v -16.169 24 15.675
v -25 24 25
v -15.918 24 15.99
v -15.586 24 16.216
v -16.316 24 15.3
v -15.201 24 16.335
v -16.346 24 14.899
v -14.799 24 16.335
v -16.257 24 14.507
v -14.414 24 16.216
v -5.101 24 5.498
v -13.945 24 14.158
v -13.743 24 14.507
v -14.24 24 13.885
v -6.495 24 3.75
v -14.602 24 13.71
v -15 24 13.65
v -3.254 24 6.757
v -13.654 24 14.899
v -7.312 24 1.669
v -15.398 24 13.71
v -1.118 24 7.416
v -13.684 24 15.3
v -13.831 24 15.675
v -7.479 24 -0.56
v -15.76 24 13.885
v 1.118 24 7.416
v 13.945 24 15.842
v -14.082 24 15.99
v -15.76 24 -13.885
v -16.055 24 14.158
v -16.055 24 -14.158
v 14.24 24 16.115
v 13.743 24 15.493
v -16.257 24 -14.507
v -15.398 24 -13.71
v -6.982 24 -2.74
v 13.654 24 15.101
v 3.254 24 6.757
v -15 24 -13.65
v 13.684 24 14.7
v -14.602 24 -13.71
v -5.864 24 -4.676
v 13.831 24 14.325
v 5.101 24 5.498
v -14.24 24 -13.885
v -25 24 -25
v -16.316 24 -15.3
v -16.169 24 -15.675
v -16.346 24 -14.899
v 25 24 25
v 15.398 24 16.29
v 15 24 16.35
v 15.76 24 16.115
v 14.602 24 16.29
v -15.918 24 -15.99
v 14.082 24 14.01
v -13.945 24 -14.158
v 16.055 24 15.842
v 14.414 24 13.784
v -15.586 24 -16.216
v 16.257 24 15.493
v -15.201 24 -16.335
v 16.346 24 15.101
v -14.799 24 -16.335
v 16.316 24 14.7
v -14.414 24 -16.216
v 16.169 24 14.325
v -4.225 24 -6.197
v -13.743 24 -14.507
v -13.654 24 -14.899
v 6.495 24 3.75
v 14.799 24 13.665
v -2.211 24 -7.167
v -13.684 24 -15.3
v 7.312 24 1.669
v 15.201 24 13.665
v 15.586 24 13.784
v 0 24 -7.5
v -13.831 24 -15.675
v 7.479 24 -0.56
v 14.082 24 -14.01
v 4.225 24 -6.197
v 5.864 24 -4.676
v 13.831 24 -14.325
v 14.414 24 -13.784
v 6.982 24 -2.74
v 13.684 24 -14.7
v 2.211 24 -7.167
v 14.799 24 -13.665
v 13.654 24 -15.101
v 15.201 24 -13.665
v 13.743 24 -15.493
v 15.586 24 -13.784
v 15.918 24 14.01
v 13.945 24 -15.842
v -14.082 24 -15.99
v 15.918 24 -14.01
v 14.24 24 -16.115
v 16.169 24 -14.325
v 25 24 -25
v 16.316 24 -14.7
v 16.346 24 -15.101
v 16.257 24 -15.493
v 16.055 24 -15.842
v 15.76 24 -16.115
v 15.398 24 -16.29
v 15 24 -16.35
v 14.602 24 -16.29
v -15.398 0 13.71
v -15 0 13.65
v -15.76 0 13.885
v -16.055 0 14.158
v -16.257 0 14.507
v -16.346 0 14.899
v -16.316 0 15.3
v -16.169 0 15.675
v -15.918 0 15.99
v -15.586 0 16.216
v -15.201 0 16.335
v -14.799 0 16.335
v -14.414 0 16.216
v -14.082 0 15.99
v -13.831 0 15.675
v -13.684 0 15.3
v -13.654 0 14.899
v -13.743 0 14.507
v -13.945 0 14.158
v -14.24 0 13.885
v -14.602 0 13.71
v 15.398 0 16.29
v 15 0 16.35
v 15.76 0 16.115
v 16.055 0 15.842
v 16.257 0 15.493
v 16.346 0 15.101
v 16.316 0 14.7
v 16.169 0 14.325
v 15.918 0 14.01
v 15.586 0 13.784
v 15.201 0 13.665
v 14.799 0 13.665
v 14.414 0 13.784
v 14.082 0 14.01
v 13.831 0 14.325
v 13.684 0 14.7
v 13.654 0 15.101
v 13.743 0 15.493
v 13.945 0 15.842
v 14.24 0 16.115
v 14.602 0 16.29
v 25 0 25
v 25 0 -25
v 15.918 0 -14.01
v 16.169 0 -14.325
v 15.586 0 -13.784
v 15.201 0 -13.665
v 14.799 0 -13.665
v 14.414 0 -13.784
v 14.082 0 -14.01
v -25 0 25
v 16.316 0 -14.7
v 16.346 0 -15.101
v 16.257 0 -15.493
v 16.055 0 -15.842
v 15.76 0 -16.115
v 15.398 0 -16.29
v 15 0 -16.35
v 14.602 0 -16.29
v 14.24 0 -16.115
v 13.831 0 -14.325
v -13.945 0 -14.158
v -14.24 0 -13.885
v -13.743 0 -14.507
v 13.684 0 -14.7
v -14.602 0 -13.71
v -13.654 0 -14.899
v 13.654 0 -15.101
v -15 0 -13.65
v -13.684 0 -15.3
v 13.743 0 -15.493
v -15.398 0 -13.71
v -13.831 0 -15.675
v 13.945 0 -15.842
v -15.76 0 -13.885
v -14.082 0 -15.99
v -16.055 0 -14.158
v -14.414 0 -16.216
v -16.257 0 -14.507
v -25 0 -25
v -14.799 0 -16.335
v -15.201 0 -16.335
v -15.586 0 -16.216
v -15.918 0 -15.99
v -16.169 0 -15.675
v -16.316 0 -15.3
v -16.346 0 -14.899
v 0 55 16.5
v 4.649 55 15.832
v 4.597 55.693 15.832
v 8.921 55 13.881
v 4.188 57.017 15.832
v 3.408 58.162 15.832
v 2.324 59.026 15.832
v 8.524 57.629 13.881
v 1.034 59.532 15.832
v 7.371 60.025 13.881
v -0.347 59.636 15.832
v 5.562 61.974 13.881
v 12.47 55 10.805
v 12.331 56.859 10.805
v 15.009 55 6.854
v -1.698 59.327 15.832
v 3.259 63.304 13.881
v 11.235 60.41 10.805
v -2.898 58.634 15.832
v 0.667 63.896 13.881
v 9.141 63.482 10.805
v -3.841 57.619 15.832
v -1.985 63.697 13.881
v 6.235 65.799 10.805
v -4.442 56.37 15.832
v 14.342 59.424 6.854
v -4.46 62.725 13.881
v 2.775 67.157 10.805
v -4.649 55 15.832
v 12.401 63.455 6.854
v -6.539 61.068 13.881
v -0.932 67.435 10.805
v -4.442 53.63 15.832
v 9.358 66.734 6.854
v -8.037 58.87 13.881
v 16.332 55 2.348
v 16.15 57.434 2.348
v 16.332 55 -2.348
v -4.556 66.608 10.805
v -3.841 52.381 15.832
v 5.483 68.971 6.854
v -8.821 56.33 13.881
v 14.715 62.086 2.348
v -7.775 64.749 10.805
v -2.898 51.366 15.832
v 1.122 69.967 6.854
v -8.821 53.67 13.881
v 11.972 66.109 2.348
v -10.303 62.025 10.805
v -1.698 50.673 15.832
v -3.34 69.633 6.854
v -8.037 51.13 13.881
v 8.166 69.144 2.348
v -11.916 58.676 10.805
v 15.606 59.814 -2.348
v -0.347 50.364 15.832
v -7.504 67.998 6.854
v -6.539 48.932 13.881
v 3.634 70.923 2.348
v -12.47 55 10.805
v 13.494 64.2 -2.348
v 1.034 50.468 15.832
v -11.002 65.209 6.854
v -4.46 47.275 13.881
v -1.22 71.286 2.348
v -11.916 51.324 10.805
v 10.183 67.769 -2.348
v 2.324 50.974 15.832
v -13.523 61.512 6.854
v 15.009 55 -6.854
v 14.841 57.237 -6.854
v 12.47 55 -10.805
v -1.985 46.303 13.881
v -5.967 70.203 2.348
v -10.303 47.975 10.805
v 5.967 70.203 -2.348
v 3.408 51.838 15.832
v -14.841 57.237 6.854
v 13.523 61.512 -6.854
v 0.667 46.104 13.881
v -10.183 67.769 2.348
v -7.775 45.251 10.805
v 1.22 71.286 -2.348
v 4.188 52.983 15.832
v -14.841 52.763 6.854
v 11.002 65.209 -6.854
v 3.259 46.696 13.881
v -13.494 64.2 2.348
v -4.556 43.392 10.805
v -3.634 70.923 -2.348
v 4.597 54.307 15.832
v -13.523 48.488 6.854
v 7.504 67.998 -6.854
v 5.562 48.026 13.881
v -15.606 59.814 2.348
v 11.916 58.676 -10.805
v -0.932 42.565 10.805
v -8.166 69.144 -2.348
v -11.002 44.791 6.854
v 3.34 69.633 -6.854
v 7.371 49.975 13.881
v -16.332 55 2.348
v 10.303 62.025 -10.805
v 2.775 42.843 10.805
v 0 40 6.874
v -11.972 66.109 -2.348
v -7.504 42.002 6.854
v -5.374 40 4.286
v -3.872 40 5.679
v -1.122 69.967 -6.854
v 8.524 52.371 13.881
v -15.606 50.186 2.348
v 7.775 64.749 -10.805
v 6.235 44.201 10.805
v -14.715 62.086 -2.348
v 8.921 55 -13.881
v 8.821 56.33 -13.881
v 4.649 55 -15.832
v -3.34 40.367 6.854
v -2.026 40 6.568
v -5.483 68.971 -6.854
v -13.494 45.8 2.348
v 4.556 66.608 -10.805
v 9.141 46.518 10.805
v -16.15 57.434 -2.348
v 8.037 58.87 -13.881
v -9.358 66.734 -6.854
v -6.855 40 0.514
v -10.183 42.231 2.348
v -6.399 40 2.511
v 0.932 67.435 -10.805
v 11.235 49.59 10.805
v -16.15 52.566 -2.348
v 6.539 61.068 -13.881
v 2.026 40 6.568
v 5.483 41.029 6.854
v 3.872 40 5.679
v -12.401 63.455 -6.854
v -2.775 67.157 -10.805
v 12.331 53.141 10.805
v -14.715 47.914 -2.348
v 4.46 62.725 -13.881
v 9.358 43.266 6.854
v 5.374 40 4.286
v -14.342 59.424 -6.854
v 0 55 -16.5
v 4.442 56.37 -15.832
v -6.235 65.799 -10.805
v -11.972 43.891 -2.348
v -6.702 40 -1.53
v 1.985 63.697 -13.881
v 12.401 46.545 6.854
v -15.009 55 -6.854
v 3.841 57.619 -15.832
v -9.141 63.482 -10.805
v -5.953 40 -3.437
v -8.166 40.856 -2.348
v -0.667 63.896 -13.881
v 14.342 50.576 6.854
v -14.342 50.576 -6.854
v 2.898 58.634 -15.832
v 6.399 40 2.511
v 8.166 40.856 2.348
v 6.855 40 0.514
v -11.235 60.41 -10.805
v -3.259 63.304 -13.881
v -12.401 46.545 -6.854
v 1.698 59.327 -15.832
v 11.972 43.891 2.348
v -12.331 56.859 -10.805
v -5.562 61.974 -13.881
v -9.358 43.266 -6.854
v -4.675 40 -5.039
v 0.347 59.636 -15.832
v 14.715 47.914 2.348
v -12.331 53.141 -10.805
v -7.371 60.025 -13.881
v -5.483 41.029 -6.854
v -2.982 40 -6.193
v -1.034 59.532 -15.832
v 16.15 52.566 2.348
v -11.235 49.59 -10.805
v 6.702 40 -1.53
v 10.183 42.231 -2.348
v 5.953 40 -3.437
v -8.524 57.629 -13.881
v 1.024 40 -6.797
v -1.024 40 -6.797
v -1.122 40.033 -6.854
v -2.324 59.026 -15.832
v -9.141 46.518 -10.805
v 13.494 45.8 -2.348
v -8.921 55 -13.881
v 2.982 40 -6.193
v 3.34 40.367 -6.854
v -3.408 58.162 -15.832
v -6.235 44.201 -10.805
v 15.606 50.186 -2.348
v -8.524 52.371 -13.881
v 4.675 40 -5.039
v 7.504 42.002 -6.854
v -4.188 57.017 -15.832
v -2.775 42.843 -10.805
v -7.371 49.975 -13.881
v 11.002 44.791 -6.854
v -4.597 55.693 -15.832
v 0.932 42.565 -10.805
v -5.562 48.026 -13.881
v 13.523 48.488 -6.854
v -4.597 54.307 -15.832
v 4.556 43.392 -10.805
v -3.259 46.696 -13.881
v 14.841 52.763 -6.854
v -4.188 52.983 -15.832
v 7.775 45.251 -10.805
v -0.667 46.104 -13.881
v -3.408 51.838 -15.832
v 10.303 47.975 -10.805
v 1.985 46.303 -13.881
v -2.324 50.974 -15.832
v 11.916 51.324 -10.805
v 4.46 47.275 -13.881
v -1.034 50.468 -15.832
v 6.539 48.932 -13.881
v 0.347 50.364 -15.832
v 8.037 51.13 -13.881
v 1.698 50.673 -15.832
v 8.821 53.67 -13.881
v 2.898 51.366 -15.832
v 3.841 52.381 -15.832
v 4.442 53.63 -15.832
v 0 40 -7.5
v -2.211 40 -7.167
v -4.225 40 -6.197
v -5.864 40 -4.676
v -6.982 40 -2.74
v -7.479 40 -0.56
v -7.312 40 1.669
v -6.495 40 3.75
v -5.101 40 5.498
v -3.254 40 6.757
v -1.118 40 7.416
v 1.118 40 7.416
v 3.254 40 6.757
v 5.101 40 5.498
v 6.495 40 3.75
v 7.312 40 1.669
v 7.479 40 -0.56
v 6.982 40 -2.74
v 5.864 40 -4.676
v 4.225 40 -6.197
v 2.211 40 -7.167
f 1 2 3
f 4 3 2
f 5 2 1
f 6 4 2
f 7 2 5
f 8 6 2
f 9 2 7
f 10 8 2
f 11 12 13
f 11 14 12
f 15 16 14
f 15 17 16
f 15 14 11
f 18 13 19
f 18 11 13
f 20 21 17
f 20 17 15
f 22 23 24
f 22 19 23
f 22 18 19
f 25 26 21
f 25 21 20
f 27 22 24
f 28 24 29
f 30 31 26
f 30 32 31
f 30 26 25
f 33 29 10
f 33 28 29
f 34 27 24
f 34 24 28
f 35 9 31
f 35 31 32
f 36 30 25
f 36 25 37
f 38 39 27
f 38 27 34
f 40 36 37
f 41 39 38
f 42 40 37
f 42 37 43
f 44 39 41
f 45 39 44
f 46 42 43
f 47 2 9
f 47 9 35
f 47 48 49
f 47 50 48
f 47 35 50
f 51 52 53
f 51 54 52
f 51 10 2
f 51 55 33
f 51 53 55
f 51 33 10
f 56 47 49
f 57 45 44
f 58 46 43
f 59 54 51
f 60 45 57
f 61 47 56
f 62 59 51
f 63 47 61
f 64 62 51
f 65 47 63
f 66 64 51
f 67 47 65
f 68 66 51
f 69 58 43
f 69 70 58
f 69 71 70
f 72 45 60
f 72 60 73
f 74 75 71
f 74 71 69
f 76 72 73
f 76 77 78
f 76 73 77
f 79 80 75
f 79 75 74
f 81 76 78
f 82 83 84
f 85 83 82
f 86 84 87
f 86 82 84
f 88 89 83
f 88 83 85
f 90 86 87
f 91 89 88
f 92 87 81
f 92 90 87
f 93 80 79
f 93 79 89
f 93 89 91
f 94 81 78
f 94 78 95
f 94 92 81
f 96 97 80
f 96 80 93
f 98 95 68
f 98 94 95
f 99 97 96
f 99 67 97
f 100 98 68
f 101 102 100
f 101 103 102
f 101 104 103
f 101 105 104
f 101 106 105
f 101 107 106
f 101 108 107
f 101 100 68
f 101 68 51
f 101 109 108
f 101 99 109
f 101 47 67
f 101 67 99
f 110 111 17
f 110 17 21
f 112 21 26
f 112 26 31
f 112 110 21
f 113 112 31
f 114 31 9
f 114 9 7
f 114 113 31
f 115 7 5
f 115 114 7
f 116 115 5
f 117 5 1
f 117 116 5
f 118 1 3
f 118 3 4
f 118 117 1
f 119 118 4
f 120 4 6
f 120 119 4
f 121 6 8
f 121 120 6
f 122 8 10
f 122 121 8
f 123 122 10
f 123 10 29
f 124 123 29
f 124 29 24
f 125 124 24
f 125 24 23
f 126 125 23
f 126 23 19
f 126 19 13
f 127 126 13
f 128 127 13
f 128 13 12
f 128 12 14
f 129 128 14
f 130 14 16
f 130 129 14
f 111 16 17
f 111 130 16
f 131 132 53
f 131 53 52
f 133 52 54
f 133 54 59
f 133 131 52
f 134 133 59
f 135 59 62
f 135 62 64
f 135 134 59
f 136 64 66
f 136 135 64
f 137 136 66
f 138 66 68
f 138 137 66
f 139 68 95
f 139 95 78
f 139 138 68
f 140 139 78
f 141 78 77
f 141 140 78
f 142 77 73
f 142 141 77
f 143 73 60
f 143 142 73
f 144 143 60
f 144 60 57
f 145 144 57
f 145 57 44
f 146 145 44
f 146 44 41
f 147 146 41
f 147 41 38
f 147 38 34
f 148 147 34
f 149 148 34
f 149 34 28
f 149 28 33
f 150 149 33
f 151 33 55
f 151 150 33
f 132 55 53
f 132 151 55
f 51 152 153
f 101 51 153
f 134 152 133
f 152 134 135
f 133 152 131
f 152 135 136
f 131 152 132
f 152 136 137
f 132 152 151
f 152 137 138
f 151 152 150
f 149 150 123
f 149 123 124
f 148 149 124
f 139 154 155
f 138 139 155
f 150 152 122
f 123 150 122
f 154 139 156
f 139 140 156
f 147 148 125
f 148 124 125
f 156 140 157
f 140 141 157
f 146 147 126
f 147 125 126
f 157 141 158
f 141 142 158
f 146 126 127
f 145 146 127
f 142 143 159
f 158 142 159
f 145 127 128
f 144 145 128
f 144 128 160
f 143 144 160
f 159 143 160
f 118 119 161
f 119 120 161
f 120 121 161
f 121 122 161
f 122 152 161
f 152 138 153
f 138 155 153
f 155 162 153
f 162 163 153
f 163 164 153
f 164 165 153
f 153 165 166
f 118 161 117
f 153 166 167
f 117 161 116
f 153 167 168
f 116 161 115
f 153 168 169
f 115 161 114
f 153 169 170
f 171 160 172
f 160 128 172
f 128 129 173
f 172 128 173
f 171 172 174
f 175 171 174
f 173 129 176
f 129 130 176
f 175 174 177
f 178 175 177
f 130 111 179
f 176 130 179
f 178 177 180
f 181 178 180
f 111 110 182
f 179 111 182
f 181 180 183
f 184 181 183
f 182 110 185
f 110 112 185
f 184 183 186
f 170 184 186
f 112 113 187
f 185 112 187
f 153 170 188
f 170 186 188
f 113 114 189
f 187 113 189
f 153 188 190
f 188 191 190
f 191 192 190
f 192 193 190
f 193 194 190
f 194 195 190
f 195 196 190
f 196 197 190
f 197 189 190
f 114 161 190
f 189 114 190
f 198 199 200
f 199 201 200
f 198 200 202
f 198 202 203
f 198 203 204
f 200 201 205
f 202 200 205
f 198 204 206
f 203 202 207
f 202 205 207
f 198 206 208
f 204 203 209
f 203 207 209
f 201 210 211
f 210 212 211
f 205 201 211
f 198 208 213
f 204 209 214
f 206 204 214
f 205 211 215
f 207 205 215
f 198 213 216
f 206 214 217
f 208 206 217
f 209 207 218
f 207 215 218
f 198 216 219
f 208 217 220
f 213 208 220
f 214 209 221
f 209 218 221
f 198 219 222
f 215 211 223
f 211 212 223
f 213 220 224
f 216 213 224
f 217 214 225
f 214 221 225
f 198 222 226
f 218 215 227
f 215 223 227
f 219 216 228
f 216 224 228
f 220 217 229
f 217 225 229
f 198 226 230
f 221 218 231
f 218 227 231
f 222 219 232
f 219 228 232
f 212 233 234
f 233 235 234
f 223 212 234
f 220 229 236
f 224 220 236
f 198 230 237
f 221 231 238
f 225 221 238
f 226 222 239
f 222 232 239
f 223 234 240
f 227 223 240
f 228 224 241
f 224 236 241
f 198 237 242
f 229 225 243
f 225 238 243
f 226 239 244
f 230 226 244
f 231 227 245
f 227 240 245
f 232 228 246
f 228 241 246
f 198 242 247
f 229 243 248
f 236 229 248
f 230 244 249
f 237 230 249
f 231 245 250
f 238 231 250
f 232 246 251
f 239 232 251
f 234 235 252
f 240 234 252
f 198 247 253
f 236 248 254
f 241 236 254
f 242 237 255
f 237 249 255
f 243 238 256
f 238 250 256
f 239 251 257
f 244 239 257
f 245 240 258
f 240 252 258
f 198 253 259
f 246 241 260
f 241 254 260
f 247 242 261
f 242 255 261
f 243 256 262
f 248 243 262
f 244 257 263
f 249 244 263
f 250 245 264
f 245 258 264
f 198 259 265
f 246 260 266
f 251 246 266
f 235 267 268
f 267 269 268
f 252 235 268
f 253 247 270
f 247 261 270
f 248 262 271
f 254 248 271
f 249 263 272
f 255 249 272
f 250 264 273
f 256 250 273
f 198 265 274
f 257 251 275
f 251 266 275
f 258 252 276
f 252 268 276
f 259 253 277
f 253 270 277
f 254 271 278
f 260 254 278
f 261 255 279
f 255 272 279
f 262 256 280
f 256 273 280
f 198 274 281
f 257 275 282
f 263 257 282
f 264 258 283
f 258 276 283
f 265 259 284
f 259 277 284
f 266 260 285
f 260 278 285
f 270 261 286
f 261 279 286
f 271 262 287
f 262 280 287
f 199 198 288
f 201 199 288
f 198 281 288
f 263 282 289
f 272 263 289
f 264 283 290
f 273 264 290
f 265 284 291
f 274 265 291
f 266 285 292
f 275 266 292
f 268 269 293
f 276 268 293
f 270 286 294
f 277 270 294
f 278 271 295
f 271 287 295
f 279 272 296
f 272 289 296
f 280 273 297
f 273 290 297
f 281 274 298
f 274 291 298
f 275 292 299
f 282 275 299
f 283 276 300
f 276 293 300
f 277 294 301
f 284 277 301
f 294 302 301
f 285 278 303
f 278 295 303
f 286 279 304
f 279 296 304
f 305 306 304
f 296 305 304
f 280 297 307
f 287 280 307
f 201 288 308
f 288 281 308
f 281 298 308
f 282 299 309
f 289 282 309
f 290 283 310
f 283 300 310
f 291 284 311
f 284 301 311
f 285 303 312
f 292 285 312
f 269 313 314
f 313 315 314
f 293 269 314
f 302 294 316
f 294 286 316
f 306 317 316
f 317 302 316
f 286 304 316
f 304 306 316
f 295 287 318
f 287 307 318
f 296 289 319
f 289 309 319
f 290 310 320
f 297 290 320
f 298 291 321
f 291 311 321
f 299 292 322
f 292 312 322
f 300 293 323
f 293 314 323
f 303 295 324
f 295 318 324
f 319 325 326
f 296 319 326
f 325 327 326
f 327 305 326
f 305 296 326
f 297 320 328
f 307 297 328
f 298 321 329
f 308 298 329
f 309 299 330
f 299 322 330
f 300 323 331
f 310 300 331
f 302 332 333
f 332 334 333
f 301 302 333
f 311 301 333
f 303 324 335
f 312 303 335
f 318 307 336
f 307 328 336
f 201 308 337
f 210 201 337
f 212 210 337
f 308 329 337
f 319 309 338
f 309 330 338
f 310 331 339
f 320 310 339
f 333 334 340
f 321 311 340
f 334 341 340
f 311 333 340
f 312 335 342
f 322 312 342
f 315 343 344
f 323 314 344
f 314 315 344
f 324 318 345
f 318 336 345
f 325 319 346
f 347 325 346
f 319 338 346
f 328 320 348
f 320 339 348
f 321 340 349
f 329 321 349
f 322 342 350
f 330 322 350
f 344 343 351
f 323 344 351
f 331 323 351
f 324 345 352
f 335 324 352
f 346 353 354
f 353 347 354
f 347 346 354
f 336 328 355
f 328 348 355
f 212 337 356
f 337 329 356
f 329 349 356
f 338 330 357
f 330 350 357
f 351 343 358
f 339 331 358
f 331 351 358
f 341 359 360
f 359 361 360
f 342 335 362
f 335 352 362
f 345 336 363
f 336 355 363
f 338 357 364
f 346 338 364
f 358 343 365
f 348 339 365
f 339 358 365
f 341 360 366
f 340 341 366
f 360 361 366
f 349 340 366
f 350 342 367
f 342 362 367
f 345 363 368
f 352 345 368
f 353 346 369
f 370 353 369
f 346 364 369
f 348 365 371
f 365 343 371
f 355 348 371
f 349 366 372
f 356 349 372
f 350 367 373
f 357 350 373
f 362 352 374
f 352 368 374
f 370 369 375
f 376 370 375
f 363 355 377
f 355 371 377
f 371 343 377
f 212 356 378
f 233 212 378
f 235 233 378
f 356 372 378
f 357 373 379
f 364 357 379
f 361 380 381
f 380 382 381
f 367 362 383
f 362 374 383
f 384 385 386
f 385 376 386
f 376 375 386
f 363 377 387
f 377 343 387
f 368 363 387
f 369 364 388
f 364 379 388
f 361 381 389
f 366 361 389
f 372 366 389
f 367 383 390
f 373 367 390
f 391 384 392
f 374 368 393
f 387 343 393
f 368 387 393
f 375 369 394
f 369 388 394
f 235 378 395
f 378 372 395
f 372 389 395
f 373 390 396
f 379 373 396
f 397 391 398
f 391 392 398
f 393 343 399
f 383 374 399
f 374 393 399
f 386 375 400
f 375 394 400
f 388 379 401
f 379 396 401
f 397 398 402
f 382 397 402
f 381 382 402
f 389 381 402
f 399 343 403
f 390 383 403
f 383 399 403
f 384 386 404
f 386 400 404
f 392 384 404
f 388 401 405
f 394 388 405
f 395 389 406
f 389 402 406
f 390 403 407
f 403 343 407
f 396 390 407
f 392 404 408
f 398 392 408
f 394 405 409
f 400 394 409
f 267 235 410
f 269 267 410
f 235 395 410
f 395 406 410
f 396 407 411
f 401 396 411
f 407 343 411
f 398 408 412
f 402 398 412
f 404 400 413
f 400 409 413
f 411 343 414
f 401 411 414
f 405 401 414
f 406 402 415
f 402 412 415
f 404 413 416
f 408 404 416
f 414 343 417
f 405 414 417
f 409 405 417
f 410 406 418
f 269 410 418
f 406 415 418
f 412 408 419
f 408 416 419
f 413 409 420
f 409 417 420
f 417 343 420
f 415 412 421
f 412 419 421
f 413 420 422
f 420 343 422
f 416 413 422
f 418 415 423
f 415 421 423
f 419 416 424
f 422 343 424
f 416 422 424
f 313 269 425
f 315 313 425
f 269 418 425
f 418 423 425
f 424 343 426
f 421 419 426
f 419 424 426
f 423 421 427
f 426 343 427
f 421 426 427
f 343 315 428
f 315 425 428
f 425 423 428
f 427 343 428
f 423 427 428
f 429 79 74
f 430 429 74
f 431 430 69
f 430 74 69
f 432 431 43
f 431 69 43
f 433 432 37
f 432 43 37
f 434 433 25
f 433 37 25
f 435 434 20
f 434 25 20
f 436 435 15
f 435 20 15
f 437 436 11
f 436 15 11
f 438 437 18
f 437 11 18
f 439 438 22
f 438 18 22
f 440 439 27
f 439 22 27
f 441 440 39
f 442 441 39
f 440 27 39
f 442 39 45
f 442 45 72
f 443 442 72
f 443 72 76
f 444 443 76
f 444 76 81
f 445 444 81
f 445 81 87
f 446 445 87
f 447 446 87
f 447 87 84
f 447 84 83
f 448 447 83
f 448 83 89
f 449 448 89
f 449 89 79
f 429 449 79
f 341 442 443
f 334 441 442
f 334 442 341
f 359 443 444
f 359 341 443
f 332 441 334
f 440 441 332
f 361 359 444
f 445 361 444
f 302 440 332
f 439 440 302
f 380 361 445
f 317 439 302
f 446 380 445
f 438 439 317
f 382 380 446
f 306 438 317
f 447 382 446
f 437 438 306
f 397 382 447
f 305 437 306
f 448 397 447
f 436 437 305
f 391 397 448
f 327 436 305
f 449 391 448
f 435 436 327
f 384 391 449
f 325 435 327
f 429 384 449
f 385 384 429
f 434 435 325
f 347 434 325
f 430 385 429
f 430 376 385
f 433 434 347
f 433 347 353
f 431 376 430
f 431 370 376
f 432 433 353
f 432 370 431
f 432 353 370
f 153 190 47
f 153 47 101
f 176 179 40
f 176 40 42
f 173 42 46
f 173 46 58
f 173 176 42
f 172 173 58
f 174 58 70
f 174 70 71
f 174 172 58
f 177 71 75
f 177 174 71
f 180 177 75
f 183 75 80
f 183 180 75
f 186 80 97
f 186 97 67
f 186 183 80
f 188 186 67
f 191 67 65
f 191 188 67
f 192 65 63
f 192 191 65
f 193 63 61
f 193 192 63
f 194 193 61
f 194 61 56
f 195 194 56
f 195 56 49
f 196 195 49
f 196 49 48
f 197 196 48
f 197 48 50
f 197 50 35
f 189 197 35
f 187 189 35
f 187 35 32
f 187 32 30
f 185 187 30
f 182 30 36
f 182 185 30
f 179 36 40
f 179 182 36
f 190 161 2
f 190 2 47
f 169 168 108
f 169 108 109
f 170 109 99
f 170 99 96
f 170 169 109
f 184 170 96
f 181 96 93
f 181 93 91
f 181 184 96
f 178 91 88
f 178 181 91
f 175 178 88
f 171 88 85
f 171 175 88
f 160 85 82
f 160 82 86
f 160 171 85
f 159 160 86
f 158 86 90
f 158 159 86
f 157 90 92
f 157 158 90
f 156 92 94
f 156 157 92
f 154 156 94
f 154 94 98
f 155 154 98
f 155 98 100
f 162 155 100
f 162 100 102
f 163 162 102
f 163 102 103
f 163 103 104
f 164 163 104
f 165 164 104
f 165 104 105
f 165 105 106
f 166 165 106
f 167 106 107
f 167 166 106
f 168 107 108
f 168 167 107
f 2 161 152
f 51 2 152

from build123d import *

# Parameters (mm, degrees)
CROQUIS1_W              = 50
CROQUIS1_H              = 50
CROQUIS1_R              = 1.35
SALIENTE_EXTRUIR1_DEPTH = 24
CROQUIS2_R              = 7.5
SALIENTE_EXTRUIR2_DEPTH = 40


with BuildPart() as part:
    # Croquis1 → Saliente-Extruir1 (new body)
    with BuildSketch(Plane(origin=(0, 0, 0), x_dir=(1, 0, 0), z_dir=(0, 1, 0))):
        Rectangle(CROQUIS1_W, CROQUIS1_H)
        with Locations(Location((-15, 15, 0), (0, 0, 270))):
            Circle(CROQUIS1_R, mode=Mode.SUBTRACT)
        with Locations(Location((15, 15, 0), (0, 0, 90))):
            Circle(CROQUIS1_R, mode=Mode.SUBTRACT)
        with Locations(Location((-15, -15, 0), (0, 0, 90))):
            Circle(CROQUIS1_R, mode=Mode.SUBTRACT)
        with Locations(Location((15, -15, 0), (0, 0, 270))):
            Circle(CROQUIS1_R, mode=Mode.SUBTRACT)
    extrude(amount=SALIENTE_EXTRUIR1_DEPTH)

    # Croquis2 → Saliente-Extruir2 (add)
    with BuildSketch(Plane(origin=(0, 0, 0), x_dir=(1, 0, 0), z_dir=(0, 1, 0))):
        with Locations(Location((0, 0, 0), (0, 0, 90))):
            Circle(CROQUIS2_R)
    extrude(amount=SALIENTE_EXTRUIR2_DEPTH)

    # Croquis3 → Revolución1 (revolve)
    with BuildSketch(Plane(origin=(0, 55, 0), x_dir=(1, 0, 0), z_dir=(0, 1, 0))):
        with BuildLine():
            Line((0, 16.5), (0, -16.5))
            ThreePointArc((0, -16.5), (16.5, 0), (0, 16.5))
        make_face()
    revolve(axis=Axis((0, 55, -16.5), (0, 0, 1)))


solid = part.part
